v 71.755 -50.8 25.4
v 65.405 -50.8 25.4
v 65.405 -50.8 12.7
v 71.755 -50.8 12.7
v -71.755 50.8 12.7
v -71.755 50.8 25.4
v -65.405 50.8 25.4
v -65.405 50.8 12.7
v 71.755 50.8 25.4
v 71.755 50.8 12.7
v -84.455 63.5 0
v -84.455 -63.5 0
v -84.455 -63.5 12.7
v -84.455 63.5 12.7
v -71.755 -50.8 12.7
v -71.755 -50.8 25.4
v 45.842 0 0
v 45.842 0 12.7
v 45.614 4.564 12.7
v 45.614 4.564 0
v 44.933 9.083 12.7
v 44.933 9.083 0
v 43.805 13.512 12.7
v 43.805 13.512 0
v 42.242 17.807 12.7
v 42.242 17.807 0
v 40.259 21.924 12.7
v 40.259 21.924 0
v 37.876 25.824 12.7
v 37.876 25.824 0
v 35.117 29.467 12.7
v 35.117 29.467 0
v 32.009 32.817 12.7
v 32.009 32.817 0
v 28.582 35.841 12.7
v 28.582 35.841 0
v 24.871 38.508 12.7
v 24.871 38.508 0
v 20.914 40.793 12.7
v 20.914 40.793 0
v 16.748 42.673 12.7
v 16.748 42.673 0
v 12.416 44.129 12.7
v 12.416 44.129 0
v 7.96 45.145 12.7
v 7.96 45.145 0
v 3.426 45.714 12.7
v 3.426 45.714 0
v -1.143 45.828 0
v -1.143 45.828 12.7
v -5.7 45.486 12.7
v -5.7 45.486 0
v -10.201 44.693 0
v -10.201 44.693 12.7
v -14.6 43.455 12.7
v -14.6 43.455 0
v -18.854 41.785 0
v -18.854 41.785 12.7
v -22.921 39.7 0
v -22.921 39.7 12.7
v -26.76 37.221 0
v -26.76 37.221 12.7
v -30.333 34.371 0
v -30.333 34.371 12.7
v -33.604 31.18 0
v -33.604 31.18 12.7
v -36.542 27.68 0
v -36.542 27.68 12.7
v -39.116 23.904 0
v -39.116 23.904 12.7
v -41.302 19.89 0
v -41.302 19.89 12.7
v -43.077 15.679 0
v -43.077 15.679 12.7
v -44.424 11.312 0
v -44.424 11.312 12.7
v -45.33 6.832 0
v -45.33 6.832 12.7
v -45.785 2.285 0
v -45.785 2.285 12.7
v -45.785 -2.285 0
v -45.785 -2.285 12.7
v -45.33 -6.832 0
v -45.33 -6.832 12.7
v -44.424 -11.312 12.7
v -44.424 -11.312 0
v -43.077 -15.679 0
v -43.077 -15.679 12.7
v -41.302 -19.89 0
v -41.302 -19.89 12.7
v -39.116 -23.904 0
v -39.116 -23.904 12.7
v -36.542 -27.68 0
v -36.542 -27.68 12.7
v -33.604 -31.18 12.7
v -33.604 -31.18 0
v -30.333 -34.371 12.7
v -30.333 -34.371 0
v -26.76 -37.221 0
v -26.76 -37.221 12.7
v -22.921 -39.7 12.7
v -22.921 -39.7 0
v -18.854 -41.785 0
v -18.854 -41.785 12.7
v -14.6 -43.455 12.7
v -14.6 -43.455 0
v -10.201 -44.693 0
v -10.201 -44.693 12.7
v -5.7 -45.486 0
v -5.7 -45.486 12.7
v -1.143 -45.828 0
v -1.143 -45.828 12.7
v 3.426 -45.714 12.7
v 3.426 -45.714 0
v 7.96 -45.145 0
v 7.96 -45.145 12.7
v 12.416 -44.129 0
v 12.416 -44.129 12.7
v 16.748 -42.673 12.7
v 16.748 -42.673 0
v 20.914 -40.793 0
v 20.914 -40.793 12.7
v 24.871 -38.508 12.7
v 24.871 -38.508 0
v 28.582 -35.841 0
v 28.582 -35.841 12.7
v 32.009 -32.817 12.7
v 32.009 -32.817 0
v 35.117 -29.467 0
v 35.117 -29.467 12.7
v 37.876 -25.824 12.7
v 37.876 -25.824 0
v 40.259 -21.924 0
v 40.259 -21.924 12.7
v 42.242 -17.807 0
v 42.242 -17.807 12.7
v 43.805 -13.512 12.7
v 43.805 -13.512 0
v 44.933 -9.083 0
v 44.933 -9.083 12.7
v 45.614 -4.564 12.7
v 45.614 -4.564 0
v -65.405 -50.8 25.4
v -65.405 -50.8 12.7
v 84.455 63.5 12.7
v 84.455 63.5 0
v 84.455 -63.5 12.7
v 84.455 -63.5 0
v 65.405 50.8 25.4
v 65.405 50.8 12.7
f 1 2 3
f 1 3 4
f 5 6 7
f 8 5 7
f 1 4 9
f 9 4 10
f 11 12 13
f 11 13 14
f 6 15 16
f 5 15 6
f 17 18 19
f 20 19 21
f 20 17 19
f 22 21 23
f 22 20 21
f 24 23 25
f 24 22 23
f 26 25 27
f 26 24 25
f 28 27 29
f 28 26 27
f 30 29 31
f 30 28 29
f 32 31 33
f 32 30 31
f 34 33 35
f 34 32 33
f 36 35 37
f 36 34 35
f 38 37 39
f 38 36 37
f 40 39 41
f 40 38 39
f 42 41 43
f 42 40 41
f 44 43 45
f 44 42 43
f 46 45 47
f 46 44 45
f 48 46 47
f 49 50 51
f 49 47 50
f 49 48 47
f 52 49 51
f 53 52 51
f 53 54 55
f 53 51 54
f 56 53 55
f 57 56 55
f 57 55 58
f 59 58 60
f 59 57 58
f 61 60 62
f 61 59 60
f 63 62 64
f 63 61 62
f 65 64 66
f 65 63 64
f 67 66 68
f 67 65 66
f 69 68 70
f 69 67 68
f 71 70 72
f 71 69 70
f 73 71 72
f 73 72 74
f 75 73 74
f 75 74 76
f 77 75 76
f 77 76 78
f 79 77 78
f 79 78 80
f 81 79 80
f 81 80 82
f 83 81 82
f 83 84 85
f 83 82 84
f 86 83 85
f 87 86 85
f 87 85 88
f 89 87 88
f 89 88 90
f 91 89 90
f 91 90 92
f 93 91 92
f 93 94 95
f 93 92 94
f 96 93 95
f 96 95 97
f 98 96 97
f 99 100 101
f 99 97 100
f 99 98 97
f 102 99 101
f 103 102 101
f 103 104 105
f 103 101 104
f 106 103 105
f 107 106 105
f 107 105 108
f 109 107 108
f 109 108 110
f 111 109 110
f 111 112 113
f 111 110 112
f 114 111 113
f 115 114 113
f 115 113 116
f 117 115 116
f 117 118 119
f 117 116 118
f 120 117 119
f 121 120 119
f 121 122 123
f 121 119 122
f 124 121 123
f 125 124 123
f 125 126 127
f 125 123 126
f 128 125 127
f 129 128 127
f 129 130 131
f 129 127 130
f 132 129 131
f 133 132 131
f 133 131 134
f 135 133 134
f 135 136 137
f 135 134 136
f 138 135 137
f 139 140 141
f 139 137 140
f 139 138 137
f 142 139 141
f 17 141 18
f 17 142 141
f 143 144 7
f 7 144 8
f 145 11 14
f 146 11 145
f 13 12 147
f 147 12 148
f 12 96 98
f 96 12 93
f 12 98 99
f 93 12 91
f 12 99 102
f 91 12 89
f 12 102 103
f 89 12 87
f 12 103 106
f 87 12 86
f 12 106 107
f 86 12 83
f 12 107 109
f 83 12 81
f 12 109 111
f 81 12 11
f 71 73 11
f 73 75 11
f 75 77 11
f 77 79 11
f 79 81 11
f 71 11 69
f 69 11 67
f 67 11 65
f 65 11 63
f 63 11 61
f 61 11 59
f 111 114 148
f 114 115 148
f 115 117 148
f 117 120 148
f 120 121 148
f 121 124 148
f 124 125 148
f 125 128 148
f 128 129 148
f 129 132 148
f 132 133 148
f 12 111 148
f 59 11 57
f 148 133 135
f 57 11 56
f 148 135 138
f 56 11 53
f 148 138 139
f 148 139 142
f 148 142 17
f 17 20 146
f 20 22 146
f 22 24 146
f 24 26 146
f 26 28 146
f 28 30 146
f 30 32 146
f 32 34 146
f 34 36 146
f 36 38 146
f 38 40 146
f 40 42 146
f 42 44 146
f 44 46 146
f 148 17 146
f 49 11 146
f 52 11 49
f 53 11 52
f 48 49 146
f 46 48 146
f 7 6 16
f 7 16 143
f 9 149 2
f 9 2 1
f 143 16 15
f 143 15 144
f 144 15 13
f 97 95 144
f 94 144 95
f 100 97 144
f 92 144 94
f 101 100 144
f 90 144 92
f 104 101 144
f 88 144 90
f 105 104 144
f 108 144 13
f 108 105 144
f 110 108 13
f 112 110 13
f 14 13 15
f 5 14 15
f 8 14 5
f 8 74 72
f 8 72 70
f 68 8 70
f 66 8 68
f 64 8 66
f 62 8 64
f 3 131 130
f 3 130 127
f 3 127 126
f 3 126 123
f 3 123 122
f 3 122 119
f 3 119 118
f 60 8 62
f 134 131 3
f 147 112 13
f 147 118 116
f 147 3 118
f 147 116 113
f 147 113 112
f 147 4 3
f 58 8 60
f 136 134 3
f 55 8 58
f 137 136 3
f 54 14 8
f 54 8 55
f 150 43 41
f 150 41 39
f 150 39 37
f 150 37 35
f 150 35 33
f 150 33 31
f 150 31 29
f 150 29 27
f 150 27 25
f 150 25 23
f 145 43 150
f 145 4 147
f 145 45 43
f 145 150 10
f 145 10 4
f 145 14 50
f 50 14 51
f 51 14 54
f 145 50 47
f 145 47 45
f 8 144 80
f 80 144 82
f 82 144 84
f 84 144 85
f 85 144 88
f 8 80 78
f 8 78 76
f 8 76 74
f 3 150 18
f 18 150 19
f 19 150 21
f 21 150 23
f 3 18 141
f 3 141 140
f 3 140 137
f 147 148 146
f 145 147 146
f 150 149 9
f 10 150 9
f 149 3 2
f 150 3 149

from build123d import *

# Parameters (mm, degrees)
F0_W     = 168.91
F0_H     = 127
F1_DEPTH = 12.7
F2_W     = 6.35
F2_H     = 101.6
F3_DEPTH = 12.7
F4_R     = 45.84191
F5_DEPTH = 25.4


with BuildPart() as f1:
    # F0 (on Top) → F1 (new body)
    with BuildSketch(Plane.XY):
        Rectangle(F0_W, F0_H)
    extrude(amount=F1_DEPTH)

    # F2 (on face) → F3 (join)
    with BuildSketch(Plane.XY.offset(12.7)):
        with Locations((68.58, 0)):
            Rectangle(F2_W, F2_H)
        with Locations((-68.58, 0)):
            Rectangle(F2_W, F2_H)
    extrude(amount=F3_DEPTH)

    # F4 (on Top) → F5 (cut)
    with BuildSketch(Plane.XY):
        Circle(F4_R)
    extrude(amount=F5_DEPTH, mode=Mode.SUBTRACT)


solid = f1.part
